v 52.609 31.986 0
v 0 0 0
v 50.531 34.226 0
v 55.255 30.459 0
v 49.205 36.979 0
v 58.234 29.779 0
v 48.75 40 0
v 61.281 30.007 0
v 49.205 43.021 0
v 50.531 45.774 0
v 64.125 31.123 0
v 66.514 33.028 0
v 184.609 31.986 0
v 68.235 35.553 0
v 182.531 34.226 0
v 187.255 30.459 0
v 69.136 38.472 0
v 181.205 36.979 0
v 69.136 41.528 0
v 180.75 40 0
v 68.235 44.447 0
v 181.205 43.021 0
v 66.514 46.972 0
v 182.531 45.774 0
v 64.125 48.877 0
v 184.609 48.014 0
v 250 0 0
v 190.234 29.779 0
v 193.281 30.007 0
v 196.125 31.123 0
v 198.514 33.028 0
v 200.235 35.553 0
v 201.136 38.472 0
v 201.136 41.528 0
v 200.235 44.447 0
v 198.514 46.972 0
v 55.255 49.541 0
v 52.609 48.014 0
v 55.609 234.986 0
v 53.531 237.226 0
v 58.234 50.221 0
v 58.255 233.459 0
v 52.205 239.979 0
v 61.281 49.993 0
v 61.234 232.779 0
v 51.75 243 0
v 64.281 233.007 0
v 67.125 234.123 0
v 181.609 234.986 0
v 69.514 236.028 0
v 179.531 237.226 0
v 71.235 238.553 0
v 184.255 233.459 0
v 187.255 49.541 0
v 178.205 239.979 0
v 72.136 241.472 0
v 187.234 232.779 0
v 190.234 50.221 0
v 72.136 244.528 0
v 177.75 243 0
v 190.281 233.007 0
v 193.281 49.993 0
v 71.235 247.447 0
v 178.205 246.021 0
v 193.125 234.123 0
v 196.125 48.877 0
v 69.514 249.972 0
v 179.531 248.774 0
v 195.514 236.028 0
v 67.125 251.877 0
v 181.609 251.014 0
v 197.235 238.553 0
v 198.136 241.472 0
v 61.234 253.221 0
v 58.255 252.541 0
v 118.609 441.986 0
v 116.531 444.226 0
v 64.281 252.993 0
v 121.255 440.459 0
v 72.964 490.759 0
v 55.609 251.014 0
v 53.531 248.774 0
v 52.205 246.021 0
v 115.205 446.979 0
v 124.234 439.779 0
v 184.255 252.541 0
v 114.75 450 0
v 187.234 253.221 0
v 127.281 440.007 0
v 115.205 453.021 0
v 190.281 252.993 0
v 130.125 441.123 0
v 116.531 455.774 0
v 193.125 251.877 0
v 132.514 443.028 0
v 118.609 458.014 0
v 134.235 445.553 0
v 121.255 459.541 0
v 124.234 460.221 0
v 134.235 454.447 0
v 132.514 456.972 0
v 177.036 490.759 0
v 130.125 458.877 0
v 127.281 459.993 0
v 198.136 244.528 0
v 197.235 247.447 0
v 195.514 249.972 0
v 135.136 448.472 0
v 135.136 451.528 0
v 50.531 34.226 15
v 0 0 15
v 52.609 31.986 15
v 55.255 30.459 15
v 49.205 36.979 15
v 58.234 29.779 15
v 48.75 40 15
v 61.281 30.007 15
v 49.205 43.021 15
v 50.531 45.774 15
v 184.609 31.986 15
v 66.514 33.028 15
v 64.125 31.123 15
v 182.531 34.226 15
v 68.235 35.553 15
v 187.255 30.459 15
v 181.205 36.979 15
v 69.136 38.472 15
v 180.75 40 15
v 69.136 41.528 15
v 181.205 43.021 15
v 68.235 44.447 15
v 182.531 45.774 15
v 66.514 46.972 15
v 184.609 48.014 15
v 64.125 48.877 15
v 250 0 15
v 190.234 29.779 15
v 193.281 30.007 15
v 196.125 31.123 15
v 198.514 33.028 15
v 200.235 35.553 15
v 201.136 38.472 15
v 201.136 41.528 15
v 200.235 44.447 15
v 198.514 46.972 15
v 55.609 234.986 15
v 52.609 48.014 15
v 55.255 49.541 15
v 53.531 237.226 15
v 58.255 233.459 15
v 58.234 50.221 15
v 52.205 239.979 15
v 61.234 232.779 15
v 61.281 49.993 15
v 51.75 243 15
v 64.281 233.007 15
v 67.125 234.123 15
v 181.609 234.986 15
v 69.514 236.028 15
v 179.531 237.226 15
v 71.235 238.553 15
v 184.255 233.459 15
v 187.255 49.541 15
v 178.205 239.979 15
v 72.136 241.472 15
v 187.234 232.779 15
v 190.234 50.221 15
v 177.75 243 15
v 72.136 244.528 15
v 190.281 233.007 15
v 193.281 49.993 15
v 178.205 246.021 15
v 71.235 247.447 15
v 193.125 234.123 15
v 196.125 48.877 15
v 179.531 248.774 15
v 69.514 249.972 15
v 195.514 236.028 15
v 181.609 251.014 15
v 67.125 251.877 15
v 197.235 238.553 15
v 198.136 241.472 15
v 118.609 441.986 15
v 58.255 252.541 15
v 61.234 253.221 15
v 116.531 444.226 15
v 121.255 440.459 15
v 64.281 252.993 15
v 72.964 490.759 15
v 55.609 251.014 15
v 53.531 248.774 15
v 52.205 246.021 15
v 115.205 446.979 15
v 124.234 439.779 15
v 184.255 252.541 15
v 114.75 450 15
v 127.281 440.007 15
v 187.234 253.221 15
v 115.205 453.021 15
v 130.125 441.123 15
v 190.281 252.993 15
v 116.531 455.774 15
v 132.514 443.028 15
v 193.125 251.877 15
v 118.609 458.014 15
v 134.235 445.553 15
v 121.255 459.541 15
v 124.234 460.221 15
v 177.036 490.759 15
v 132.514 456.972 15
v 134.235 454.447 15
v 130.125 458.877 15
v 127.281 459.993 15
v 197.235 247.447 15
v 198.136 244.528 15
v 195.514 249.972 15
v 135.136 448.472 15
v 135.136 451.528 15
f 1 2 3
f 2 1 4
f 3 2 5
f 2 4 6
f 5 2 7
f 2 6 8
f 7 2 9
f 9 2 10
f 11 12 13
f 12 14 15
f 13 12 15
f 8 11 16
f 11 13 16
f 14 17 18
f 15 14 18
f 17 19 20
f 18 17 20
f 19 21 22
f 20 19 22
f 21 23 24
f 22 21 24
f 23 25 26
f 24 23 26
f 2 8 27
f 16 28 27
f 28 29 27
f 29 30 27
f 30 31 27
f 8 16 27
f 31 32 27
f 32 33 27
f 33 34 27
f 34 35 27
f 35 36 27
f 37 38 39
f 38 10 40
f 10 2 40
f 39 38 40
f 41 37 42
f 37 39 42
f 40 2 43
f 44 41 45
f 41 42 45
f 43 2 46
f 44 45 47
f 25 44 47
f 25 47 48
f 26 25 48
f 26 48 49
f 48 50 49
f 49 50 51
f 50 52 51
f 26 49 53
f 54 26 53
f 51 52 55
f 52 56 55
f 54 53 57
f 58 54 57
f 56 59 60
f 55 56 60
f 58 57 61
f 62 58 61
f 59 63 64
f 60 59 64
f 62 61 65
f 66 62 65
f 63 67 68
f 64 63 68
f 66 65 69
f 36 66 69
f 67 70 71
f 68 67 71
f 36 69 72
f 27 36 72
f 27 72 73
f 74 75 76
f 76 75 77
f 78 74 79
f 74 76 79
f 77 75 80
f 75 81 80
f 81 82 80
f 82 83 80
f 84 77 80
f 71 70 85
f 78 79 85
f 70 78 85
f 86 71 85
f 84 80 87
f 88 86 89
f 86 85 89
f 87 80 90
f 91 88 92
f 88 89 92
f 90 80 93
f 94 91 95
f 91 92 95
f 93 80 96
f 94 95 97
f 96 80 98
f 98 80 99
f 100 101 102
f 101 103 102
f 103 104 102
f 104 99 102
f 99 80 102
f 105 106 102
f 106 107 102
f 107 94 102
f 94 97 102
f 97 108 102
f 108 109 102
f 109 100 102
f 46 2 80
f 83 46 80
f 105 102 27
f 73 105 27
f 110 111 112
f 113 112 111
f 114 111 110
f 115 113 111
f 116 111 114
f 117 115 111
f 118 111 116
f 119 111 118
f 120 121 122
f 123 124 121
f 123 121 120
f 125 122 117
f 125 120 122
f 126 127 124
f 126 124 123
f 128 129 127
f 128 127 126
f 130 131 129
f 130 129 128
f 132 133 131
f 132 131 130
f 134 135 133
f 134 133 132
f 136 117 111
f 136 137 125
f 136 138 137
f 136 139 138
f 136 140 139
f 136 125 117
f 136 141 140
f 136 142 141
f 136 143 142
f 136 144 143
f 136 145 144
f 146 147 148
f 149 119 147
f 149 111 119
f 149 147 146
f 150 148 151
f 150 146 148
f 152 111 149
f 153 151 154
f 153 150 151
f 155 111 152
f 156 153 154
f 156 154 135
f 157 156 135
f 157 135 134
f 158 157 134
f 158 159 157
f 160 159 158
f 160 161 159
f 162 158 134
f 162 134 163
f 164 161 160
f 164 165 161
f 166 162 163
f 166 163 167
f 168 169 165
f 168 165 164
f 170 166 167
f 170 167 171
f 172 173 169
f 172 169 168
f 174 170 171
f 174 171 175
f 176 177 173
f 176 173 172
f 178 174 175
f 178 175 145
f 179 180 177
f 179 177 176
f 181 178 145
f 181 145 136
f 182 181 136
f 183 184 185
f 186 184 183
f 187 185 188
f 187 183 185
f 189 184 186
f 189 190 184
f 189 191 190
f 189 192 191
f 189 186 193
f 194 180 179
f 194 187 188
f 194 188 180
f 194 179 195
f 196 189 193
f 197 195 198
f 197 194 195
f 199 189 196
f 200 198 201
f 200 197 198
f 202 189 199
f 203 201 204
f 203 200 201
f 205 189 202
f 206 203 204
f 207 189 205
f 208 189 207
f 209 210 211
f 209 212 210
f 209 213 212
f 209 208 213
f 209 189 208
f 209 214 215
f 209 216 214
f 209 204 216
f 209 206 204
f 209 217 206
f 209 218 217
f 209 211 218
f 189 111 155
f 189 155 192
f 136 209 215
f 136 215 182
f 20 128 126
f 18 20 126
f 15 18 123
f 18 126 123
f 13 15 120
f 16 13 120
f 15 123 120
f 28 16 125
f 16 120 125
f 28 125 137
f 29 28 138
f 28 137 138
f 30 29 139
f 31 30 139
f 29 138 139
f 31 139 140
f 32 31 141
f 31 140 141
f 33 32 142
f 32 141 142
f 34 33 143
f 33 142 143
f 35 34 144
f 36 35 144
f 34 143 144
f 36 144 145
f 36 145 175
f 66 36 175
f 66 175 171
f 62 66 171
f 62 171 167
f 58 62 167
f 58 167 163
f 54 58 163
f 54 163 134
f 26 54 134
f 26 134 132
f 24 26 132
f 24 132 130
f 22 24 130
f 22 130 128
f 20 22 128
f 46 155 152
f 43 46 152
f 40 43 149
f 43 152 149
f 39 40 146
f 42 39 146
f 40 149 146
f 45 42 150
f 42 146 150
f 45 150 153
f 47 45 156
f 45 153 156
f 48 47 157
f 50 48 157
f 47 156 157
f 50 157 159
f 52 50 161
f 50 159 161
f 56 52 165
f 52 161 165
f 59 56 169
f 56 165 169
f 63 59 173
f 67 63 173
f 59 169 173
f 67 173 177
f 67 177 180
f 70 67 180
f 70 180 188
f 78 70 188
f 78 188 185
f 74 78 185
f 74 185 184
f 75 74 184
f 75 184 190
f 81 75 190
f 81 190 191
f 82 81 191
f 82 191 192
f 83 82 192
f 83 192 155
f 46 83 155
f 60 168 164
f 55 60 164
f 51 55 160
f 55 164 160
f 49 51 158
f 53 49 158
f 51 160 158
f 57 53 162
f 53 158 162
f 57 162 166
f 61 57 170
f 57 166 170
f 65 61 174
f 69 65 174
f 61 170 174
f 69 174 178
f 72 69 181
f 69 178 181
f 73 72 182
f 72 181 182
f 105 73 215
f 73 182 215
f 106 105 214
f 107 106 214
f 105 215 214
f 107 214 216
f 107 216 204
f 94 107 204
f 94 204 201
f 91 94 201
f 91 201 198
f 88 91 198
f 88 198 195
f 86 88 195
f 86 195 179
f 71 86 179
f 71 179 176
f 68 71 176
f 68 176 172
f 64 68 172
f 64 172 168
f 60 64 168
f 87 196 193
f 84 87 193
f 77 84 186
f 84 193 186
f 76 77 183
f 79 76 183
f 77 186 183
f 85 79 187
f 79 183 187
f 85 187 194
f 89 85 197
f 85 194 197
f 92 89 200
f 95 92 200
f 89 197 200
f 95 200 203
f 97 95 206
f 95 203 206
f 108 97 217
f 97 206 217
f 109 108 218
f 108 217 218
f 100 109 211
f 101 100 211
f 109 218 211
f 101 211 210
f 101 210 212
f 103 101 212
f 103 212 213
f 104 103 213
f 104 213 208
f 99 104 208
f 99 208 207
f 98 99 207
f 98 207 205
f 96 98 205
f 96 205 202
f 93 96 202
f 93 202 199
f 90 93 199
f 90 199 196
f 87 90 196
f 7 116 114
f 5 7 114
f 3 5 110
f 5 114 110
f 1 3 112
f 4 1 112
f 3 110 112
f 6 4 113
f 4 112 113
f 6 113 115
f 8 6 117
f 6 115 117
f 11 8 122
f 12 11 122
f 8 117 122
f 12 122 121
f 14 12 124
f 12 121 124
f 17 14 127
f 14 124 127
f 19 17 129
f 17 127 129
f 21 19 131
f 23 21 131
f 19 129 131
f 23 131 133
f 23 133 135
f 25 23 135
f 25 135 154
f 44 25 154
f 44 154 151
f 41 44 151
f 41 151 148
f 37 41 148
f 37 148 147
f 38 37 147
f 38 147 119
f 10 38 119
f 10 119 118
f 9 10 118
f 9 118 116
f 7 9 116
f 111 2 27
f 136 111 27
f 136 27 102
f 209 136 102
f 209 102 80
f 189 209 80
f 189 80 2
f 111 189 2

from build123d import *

# Parameters (mm, degrees)
F1_DEPTH = 15
F3_D     = 20.5


with BuildPart() as f1:
    # F0 (on Top) → F1 (new body)
    with BuildSketch(Plane.XY):
        Polygon((72.9636595731, 490.75858604), (0, 0), (125, 0), (125, 490.75858604), align=None)
        Polygon((125, 490.75858604), (125, 0), (250, 0), (177.0363404269, 490.75858604), align=None)
    extrude(amount=F1_DEPTH)

    # F3 (through all)
    with Locations(Plane(origin=(0, 0, 0), x_dir=(1, 0, 0), z_dir=(0, 0, -1))):
        with Locations((125, -450), (62, -243), (188, -243), (191, -40), (59, -40)):
            Hole(F3_D / 2)


solid = f1.part
